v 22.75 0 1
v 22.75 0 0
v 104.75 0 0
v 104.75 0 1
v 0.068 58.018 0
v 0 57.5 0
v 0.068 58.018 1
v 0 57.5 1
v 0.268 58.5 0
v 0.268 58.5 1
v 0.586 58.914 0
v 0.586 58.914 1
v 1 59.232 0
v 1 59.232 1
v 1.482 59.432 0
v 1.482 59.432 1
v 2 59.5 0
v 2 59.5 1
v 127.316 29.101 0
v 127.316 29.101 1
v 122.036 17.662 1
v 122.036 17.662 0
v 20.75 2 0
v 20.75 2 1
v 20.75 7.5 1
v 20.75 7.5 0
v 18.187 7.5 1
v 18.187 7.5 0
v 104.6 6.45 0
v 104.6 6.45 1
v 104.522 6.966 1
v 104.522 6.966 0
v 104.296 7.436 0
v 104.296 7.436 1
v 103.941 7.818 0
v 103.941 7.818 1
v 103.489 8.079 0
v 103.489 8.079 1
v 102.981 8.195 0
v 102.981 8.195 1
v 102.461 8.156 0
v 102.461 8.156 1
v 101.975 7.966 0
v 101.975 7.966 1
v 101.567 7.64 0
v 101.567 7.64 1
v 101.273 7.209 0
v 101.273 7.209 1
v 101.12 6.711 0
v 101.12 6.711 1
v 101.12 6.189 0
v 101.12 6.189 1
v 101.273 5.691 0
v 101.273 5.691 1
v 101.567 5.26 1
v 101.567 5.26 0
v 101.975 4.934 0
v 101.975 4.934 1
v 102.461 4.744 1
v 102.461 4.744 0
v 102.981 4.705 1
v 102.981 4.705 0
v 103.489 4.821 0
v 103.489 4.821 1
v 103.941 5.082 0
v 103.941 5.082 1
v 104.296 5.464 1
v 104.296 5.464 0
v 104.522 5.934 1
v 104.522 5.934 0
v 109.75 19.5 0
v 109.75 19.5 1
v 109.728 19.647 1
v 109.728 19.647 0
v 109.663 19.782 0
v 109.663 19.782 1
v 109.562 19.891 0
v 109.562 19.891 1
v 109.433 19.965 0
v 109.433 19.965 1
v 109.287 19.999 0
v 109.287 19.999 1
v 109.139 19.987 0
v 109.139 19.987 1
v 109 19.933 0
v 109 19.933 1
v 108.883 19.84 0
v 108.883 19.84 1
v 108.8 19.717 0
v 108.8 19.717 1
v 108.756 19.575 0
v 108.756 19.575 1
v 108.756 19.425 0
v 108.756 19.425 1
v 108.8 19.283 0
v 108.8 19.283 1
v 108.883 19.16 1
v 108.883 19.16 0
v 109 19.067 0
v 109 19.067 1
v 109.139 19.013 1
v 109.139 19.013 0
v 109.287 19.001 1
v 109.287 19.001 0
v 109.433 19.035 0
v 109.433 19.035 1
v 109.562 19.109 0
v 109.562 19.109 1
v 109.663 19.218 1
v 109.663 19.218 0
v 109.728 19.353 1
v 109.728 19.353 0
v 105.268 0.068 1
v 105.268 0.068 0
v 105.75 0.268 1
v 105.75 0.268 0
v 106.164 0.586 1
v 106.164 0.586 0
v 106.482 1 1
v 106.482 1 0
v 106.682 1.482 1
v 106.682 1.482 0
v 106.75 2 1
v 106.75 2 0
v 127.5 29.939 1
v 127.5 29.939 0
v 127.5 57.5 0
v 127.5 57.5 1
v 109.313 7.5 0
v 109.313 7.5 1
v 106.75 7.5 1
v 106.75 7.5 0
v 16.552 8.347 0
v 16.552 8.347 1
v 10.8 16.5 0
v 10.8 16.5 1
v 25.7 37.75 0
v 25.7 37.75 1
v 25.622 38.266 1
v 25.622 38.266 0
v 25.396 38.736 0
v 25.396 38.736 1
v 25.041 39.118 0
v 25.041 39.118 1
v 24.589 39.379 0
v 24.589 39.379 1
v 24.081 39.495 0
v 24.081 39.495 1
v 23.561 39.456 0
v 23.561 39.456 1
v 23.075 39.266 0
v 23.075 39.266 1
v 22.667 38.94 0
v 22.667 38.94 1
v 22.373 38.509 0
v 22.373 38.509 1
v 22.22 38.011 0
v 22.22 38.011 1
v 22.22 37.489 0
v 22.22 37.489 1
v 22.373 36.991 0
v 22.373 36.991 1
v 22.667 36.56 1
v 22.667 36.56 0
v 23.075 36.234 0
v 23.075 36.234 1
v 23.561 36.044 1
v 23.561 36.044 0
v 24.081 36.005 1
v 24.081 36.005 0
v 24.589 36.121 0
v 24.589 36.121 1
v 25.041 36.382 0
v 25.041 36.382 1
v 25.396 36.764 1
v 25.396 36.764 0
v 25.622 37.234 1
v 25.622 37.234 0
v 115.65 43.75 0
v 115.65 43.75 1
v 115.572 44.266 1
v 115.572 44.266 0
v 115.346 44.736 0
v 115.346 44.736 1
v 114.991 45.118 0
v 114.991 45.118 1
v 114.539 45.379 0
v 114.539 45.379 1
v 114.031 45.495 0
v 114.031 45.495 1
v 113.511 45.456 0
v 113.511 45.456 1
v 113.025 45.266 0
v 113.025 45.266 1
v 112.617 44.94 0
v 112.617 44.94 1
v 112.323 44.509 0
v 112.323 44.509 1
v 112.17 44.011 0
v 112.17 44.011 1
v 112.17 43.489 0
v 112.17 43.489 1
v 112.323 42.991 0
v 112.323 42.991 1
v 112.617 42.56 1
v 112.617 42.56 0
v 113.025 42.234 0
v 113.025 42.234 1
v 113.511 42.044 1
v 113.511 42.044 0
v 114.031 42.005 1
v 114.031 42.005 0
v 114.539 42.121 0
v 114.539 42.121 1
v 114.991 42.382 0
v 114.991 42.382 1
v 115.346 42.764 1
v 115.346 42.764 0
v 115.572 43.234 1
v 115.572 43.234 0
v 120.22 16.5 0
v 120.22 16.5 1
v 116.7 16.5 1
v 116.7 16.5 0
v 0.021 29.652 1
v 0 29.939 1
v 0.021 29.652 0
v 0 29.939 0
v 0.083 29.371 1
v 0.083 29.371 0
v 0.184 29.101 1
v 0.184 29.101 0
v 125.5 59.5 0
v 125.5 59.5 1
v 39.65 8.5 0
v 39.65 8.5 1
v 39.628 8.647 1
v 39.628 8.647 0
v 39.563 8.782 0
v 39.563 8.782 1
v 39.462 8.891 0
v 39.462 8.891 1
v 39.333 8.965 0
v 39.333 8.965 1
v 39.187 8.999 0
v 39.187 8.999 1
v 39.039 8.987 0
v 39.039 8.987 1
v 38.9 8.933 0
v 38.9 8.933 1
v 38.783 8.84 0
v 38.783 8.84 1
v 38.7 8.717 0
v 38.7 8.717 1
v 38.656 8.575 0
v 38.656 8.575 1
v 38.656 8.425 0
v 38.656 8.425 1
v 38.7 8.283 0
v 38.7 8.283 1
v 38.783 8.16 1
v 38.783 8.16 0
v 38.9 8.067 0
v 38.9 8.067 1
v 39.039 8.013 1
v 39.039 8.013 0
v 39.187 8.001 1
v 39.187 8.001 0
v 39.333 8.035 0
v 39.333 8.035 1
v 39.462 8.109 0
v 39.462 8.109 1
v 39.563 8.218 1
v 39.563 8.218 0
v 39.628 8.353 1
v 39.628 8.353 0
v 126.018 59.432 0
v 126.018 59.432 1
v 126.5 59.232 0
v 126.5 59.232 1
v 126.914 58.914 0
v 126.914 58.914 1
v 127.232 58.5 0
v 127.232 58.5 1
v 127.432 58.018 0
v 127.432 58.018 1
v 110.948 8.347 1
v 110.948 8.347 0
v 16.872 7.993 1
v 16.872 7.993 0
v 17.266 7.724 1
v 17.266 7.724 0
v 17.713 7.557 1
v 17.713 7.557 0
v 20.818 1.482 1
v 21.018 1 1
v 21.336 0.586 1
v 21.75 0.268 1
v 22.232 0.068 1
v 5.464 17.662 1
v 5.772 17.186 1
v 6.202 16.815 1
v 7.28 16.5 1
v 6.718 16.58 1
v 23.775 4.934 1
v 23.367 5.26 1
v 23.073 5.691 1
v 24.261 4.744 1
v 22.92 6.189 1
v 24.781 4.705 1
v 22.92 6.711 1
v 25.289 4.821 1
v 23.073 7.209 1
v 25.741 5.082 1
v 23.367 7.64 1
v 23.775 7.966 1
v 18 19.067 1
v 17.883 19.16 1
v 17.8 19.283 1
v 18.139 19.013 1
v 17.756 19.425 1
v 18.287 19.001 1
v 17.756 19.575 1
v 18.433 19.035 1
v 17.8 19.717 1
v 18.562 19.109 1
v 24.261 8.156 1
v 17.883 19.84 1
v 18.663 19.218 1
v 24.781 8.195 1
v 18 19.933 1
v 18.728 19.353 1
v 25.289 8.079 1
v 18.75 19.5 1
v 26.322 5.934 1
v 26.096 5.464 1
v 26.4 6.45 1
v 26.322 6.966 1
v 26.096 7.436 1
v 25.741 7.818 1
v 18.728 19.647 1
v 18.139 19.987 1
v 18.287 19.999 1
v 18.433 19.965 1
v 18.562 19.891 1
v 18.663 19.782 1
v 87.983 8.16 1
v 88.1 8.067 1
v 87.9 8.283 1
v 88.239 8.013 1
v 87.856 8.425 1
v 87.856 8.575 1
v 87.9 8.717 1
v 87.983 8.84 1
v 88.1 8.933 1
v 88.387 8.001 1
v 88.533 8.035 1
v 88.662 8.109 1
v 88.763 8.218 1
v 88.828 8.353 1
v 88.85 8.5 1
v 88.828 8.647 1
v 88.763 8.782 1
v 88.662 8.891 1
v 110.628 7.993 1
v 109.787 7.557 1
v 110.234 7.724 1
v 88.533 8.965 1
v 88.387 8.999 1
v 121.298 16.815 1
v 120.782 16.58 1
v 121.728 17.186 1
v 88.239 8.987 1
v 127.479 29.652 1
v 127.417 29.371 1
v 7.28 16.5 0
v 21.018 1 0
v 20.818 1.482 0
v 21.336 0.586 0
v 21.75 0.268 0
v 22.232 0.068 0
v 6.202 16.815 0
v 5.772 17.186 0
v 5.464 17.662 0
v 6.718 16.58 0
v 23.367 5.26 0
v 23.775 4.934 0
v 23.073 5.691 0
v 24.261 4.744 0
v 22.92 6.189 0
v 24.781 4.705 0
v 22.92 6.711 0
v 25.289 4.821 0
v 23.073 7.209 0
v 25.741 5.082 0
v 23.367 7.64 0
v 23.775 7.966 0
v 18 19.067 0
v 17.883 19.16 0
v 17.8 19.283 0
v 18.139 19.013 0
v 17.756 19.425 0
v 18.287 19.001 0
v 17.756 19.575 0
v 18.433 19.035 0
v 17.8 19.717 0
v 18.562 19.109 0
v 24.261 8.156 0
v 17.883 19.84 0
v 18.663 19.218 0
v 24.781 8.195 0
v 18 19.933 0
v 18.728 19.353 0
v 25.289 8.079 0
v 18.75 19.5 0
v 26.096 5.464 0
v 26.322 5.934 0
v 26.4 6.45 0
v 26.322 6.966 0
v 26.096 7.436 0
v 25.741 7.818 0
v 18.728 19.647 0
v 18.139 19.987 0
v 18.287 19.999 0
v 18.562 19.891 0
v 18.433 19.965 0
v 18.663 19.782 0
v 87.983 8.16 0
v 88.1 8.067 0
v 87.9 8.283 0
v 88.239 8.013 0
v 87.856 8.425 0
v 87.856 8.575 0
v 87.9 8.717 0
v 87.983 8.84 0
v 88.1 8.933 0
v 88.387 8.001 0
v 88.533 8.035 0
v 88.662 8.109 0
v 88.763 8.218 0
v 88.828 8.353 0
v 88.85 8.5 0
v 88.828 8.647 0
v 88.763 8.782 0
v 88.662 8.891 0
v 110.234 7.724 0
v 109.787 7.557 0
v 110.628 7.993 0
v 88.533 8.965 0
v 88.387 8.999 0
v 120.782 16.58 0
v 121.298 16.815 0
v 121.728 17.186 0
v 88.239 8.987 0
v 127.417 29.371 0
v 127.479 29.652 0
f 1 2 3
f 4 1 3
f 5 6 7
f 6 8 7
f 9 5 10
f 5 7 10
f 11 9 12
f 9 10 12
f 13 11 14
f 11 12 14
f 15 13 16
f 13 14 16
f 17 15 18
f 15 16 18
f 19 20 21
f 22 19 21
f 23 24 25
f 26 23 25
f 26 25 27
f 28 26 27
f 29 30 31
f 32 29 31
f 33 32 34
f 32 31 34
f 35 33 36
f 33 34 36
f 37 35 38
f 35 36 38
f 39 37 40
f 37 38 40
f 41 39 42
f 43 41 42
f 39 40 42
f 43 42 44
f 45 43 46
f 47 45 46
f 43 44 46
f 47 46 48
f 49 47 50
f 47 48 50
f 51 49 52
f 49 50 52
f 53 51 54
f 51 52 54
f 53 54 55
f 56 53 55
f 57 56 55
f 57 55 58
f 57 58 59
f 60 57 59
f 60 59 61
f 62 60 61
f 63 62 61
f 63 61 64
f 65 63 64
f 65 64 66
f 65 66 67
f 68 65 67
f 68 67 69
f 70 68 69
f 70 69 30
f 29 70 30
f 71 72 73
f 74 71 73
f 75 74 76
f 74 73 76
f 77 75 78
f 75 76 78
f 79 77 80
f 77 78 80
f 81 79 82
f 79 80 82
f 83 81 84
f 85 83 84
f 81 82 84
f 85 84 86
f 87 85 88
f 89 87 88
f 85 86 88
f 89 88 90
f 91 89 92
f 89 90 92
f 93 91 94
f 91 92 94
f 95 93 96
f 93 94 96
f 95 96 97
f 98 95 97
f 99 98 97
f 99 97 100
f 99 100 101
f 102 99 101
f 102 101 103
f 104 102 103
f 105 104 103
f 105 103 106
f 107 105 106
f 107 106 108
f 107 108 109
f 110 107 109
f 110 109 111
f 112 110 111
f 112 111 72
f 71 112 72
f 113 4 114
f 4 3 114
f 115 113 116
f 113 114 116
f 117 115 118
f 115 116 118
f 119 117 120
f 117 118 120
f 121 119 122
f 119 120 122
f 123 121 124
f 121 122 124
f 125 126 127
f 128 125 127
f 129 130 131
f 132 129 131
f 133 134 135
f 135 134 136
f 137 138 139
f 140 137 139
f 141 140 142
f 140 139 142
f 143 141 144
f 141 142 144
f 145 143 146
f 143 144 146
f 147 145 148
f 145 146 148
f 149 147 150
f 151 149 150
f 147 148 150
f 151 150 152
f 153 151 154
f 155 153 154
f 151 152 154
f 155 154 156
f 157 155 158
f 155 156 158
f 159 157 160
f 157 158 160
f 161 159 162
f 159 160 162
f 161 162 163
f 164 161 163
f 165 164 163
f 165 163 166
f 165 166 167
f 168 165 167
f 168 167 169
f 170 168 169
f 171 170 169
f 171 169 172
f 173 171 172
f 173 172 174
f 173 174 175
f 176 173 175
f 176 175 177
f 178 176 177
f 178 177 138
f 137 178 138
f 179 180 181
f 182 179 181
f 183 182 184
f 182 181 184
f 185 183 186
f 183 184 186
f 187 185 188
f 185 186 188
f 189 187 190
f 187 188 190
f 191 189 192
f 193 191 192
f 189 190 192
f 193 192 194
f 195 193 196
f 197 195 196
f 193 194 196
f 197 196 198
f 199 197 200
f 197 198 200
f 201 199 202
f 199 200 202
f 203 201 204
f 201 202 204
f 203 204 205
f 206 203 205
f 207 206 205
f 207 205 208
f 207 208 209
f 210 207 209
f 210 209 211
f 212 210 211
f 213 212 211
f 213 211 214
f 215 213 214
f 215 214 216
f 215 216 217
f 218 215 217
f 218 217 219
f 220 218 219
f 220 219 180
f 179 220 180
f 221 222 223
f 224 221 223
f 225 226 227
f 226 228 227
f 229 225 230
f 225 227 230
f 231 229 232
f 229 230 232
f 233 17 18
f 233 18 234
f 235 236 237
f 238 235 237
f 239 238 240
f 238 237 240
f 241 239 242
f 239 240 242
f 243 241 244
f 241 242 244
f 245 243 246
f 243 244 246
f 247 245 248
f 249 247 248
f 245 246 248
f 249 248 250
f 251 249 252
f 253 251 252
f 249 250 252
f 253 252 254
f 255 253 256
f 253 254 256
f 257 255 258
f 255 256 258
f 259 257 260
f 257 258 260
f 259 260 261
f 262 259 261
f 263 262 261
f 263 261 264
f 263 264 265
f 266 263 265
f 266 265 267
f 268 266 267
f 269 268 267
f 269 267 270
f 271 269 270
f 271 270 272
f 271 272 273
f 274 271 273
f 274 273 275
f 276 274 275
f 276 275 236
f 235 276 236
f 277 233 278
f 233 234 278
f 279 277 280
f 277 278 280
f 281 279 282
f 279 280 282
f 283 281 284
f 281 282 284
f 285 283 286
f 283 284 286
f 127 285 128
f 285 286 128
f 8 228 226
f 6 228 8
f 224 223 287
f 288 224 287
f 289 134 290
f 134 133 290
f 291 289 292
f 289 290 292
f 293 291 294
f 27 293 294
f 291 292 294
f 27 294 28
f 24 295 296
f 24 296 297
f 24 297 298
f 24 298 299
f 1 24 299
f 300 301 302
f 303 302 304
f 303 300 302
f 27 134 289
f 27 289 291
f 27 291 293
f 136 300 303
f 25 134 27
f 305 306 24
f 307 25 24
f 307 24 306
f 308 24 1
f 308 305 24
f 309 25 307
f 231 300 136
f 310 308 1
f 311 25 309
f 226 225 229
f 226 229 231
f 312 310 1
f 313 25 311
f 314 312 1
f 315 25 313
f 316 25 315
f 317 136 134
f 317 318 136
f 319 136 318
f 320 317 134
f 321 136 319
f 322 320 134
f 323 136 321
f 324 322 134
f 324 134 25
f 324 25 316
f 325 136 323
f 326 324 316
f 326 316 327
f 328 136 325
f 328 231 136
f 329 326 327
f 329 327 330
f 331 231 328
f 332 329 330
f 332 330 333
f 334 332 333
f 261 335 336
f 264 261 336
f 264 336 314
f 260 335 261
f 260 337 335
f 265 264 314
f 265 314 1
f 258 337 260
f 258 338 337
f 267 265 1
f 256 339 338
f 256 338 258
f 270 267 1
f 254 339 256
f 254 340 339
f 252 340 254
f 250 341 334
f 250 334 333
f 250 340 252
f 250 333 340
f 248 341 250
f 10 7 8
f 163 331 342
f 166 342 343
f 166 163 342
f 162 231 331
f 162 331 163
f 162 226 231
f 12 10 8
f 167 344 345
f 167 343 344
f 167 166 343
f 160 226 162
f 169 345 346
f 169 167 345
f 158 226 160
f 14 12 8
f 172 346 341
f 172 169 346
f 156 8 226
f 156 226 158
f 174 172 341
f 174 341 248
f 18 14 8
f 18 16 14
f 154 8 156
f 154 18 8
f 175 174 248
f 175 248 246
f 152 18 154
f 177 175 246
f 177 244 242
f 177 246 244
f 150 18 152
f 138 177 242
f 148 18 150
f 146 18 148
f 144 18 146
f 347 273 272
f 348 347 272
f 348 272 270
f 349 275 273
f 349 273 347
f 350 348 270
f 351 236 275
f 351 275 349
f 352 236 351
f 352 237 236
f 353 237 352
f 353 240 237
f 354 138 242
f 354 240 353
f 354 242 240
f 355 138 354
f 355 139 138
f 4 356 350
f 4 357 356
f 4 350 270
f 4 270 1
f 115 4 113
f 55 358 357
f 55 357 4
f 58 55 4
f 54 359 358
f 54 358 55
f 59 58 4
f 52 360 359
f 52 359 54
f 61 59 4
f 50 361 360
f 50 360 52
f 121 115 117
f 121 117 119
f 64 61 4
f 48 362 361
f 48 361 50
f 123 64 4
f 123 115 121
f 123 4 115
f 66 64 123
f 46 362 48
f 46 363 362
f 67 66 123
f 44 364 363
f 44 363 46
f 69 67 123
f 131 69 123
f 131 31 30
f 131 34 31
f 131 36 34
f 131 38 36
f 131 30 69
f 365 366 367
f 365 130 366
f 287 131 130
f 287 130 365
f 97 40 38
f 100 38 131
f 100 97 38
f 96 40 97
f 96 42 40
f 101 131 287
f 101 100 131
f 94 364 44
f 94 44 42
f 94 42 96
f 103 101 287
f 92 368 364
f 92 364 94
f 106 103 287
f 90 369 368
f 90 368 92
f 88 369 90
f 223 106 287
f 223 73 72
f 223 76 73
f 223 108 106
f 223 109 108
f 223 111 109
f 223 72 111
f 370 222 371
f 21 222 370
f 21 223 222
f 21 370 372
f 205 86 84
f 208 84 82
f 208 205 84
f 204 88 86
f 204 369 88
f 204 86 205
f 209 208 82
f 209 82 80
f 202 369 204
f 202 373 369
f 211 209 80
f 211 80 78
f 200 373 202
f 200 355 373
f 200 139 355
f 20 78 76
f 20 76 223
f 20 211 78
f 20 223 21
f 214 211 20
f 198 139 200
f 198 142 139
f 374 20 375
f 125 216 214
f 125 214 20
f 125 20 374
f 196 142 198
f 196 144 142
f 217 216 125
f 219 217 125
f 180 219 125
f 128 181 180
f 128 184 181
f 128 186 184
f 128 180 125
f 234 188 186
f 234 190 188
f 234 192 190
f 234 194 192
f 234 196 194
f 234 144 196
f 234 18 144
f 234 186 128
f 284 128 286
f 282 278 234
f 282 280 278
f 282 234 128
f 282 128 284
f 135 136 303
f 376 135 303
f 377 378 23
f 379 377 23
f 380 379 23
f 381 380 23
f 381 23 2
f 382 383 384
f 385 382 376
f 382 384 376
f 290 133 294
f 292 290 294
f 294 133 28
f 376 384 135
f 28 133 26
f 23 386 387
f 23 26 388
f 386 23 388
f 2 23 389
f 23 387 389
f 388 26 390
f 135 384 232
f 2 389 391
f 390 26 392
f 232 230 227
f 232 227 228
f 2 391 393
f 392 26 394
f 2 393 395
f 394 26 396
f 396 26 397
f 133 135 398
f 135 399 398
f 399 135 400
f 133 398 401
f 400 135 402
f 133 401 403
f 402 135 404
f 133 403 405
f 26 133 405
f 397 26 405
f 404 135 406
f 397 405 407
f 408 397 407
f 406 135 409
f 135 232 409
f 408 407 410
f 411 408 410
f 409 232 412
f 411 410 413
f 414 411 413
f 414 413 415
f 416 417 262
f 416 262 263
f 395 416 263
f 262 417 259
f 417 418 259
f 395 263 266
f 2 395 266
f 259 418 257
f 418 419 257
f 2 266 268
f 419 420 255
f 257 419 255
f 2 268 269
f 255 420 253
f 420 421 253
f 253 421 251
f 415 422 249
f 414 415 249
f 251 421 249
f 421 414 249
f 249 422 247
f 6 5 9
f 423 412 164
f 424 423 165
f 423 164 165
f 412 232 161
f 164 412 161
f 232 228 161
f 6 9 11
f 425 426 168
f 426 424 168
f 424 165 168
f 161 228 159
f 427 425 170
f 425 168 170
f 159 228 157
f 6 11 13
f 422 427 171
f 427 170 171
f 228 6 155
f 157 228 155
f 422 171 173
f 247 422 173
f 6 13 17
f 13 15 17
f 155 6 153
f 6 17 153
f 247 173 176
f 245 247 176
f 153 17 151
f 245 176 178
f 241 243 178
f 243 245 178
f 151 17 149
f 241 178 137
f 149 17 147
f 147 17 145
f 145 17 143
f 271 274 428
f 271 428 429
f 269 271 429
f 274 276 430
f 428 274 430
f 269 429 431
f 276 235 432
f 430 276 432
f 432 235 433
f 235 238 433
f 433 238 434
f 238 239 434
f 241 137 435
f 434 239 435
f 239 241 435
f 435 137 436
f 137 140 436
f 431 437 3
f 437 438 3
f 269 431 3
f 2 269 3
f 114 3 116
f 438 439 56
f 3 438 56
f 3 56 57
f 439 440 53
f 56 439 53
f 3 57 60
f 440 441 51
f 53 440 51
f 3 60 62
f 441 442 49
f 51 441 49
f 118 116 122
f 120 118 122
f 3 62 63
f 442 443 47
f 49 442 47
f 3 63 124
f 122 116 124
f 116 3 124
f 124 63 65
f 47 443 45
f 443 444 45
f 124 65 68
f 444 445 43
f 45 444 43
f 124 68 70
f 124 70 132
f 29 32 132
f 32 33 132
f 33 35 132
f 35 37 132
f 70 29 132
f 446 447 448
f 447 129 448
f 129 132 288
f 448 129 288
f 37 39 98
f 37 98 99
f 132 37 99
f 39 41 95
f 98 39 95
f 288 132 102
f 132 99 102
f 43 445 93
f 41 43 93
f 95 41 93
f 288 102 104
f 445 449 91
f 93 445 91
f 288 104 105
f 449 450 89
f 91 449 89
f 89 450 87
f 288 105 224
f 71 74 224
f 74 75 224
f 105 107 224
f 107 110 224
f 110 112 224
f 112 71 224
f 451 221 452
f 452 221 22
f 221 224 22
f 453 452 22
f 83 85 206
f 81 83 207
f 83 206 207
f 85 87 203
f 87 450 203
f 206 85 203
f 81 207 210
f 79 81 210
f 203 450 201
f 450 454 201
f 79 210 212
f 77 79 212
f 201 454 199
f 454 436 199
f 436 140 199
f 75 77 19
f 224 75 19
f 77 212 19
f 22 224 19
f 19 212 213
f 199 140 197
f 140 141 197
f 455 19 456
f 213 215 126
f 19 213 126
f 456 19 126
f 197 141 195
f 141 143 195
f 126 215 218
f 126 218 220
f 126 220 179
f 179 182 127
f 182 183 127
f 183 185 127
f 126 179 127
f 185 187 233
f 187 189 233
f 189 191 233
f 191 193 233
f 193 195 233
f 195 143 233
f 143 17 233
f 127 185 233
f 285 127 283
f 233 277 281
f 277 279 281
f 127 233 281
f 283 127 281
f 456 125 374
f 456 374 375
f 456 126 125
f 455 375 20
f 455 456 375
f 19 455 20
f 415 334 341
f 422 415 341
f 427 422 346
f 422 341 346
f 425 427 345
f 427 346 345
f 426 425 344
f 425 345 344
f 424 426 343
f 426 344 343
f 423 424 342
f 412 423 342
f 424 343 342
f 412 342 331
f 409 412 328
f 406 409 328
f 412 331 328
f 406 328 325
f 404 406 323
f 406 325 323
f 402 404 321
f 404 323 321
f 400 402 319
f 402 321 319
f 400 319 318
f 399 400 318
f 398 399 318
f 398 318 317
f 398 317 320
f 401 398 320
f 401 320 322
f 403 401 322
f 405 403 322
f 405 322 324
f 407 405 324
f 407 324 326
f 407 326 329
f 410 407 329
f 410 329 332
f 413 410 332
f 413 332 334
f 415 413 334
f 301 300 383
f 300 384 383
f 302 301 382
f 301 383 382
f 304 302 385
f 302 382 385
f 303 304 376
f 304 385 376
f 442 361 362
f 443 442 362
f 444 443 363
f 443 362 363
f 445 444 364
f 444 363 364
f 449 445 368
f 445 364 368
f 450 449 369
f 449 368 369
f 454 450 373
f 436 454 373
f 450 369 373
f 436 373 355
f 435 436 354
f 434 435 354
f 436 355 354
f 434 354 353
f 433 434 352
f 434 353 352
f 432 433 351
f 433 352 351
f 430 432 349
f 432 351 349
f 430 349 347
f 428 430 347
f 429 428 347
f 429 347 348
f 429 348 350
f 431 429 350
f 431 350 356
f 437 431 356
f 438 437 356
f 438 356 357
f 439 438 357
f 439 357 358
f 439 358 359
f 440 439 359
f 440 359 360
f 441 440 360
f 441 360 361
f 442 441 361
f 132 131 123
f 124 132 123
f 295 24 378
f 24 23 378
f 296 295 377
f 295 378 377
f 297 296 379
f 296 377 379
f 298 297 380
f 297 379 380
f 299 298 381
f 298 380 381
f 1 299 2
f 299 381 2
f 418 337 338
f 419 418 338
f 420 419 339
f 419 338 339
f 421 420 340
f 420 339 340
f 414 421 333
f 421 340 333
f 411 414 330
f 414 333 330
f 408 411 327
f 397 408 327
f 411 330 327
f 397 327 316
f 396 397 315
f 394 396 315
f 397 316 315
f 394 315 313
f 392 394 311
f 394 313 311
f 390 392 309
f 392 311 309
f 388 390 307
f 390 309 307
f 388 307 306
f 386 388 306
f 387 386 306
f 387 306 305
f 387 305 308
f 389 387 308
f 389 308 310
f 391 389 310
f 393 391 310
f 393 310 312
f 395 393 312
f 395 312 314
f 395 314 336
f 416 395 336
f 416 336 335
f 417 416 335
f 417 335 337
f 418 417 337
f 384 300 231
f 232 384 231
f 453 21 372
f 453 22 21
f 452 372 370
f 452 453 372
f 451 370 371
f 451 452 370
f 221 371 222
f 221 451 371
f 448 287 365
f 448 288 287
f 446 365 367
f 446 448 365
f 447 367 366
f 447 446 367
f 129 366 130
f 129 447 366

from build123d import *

# Parameters (mm, degrees)
ESQUISSE1_W             = 127.5
ESQUISSE1_H             = 59.5
BOSS_EXTRU_1_DEPTH      = 1
ESQUISSE3_R             = 1.75
ENL_V_MAT_EXTRU_1_DEPTH = 141.703589151
ESQUISSE5_R             = 0.5
ENL_V_MAT_EXTRU_3_DEPTH = 141.703589151
CONG_1_R                = 2


with BuildPart() as part:
    # Esquisse1 → Boss.-Extru.1 (new body)
    with BuildSketch(Plane.XY):
        with Locations((63.75, 29.75)):
            Rectangle(ESQUISSE1_W, ESQUISSE1_H)
    extrude(amount=BOSS_EXTRU_1_DEPTH)

    # Esquisse3 → Enlèv. mat.-Extru.1 (cut, through all)
    with BuildSketch(Plane.XY.offset(1)):
        with Locations((102.85, 6.45)):
            Circle(ESQUISSE3_R)
        with Locations((113.9, 43.75)):
            Circle(ESQUISSE3_R)
        with Locations((23.95, 37.75)):
            Circle(ESQUISSE3_R)
        with Locations((24.65, 6.45)):
            Circle(ESQUISSE3_R)
        Polygon((127.5, 29.5), (121.5, 16.5), (116.7, 16.5), (110.35, 7.5), (106.75, 7.5), (106.75, 0), (127.5, 0), align=None)
        Polygon((0, 0), (20.75, 0), (20.75, 7.5), (17.15, 7.5), (10.8, 16.5), (6, 16.5), (0, 29.5), align=None)
    extrude(amount=-ENL_V_MAT_EXTRU_1_DEPTH, mode=Mode.SUBTRACT)

    # Esquisse5 → Enlèv. mat.-Extru.3 (cut, through all)
    with BuildSketch(Plane.XY.offset(1)):
        with Locations((39.15, 8.5)):
            Circle(ESQUISSE5_R)
        with Locations((88.35, 8.5)):
            Circle(ESQUISSE5_R)
        with Locations((109.25, 19.5)):
            Circle(ESQUISSE5_R)
        with Locations((18.25, 19.5)):
            Circle(ESQUISSE5_R)
    extrude(amount=-ENL_V_MAT_EXTRU_3_DEPTH, mode=Mode.SUBTRACT)

    # Congé1
    cong_1_edges = [part.edges().sort_by_distance(p)[0] for p in [
        (127.5, 29.5, 0.5),
        (106.75, 0, 0.5),
        (110.35, 7.5, 0.5),
        (121.5, 16.5, 0.5),
        (0, 29.5, 0.5),
        (6, 16.5, 0.5),
        (17.15, 7.5, 0.5),
        (20.75, 0, 0.5),
        (0, 59.5, 0.5),
        (127.5, 59.5, 0.5),
    ]]
    fillet(cong_1_edges, radius=CONG_1_R)


solid = part.part
